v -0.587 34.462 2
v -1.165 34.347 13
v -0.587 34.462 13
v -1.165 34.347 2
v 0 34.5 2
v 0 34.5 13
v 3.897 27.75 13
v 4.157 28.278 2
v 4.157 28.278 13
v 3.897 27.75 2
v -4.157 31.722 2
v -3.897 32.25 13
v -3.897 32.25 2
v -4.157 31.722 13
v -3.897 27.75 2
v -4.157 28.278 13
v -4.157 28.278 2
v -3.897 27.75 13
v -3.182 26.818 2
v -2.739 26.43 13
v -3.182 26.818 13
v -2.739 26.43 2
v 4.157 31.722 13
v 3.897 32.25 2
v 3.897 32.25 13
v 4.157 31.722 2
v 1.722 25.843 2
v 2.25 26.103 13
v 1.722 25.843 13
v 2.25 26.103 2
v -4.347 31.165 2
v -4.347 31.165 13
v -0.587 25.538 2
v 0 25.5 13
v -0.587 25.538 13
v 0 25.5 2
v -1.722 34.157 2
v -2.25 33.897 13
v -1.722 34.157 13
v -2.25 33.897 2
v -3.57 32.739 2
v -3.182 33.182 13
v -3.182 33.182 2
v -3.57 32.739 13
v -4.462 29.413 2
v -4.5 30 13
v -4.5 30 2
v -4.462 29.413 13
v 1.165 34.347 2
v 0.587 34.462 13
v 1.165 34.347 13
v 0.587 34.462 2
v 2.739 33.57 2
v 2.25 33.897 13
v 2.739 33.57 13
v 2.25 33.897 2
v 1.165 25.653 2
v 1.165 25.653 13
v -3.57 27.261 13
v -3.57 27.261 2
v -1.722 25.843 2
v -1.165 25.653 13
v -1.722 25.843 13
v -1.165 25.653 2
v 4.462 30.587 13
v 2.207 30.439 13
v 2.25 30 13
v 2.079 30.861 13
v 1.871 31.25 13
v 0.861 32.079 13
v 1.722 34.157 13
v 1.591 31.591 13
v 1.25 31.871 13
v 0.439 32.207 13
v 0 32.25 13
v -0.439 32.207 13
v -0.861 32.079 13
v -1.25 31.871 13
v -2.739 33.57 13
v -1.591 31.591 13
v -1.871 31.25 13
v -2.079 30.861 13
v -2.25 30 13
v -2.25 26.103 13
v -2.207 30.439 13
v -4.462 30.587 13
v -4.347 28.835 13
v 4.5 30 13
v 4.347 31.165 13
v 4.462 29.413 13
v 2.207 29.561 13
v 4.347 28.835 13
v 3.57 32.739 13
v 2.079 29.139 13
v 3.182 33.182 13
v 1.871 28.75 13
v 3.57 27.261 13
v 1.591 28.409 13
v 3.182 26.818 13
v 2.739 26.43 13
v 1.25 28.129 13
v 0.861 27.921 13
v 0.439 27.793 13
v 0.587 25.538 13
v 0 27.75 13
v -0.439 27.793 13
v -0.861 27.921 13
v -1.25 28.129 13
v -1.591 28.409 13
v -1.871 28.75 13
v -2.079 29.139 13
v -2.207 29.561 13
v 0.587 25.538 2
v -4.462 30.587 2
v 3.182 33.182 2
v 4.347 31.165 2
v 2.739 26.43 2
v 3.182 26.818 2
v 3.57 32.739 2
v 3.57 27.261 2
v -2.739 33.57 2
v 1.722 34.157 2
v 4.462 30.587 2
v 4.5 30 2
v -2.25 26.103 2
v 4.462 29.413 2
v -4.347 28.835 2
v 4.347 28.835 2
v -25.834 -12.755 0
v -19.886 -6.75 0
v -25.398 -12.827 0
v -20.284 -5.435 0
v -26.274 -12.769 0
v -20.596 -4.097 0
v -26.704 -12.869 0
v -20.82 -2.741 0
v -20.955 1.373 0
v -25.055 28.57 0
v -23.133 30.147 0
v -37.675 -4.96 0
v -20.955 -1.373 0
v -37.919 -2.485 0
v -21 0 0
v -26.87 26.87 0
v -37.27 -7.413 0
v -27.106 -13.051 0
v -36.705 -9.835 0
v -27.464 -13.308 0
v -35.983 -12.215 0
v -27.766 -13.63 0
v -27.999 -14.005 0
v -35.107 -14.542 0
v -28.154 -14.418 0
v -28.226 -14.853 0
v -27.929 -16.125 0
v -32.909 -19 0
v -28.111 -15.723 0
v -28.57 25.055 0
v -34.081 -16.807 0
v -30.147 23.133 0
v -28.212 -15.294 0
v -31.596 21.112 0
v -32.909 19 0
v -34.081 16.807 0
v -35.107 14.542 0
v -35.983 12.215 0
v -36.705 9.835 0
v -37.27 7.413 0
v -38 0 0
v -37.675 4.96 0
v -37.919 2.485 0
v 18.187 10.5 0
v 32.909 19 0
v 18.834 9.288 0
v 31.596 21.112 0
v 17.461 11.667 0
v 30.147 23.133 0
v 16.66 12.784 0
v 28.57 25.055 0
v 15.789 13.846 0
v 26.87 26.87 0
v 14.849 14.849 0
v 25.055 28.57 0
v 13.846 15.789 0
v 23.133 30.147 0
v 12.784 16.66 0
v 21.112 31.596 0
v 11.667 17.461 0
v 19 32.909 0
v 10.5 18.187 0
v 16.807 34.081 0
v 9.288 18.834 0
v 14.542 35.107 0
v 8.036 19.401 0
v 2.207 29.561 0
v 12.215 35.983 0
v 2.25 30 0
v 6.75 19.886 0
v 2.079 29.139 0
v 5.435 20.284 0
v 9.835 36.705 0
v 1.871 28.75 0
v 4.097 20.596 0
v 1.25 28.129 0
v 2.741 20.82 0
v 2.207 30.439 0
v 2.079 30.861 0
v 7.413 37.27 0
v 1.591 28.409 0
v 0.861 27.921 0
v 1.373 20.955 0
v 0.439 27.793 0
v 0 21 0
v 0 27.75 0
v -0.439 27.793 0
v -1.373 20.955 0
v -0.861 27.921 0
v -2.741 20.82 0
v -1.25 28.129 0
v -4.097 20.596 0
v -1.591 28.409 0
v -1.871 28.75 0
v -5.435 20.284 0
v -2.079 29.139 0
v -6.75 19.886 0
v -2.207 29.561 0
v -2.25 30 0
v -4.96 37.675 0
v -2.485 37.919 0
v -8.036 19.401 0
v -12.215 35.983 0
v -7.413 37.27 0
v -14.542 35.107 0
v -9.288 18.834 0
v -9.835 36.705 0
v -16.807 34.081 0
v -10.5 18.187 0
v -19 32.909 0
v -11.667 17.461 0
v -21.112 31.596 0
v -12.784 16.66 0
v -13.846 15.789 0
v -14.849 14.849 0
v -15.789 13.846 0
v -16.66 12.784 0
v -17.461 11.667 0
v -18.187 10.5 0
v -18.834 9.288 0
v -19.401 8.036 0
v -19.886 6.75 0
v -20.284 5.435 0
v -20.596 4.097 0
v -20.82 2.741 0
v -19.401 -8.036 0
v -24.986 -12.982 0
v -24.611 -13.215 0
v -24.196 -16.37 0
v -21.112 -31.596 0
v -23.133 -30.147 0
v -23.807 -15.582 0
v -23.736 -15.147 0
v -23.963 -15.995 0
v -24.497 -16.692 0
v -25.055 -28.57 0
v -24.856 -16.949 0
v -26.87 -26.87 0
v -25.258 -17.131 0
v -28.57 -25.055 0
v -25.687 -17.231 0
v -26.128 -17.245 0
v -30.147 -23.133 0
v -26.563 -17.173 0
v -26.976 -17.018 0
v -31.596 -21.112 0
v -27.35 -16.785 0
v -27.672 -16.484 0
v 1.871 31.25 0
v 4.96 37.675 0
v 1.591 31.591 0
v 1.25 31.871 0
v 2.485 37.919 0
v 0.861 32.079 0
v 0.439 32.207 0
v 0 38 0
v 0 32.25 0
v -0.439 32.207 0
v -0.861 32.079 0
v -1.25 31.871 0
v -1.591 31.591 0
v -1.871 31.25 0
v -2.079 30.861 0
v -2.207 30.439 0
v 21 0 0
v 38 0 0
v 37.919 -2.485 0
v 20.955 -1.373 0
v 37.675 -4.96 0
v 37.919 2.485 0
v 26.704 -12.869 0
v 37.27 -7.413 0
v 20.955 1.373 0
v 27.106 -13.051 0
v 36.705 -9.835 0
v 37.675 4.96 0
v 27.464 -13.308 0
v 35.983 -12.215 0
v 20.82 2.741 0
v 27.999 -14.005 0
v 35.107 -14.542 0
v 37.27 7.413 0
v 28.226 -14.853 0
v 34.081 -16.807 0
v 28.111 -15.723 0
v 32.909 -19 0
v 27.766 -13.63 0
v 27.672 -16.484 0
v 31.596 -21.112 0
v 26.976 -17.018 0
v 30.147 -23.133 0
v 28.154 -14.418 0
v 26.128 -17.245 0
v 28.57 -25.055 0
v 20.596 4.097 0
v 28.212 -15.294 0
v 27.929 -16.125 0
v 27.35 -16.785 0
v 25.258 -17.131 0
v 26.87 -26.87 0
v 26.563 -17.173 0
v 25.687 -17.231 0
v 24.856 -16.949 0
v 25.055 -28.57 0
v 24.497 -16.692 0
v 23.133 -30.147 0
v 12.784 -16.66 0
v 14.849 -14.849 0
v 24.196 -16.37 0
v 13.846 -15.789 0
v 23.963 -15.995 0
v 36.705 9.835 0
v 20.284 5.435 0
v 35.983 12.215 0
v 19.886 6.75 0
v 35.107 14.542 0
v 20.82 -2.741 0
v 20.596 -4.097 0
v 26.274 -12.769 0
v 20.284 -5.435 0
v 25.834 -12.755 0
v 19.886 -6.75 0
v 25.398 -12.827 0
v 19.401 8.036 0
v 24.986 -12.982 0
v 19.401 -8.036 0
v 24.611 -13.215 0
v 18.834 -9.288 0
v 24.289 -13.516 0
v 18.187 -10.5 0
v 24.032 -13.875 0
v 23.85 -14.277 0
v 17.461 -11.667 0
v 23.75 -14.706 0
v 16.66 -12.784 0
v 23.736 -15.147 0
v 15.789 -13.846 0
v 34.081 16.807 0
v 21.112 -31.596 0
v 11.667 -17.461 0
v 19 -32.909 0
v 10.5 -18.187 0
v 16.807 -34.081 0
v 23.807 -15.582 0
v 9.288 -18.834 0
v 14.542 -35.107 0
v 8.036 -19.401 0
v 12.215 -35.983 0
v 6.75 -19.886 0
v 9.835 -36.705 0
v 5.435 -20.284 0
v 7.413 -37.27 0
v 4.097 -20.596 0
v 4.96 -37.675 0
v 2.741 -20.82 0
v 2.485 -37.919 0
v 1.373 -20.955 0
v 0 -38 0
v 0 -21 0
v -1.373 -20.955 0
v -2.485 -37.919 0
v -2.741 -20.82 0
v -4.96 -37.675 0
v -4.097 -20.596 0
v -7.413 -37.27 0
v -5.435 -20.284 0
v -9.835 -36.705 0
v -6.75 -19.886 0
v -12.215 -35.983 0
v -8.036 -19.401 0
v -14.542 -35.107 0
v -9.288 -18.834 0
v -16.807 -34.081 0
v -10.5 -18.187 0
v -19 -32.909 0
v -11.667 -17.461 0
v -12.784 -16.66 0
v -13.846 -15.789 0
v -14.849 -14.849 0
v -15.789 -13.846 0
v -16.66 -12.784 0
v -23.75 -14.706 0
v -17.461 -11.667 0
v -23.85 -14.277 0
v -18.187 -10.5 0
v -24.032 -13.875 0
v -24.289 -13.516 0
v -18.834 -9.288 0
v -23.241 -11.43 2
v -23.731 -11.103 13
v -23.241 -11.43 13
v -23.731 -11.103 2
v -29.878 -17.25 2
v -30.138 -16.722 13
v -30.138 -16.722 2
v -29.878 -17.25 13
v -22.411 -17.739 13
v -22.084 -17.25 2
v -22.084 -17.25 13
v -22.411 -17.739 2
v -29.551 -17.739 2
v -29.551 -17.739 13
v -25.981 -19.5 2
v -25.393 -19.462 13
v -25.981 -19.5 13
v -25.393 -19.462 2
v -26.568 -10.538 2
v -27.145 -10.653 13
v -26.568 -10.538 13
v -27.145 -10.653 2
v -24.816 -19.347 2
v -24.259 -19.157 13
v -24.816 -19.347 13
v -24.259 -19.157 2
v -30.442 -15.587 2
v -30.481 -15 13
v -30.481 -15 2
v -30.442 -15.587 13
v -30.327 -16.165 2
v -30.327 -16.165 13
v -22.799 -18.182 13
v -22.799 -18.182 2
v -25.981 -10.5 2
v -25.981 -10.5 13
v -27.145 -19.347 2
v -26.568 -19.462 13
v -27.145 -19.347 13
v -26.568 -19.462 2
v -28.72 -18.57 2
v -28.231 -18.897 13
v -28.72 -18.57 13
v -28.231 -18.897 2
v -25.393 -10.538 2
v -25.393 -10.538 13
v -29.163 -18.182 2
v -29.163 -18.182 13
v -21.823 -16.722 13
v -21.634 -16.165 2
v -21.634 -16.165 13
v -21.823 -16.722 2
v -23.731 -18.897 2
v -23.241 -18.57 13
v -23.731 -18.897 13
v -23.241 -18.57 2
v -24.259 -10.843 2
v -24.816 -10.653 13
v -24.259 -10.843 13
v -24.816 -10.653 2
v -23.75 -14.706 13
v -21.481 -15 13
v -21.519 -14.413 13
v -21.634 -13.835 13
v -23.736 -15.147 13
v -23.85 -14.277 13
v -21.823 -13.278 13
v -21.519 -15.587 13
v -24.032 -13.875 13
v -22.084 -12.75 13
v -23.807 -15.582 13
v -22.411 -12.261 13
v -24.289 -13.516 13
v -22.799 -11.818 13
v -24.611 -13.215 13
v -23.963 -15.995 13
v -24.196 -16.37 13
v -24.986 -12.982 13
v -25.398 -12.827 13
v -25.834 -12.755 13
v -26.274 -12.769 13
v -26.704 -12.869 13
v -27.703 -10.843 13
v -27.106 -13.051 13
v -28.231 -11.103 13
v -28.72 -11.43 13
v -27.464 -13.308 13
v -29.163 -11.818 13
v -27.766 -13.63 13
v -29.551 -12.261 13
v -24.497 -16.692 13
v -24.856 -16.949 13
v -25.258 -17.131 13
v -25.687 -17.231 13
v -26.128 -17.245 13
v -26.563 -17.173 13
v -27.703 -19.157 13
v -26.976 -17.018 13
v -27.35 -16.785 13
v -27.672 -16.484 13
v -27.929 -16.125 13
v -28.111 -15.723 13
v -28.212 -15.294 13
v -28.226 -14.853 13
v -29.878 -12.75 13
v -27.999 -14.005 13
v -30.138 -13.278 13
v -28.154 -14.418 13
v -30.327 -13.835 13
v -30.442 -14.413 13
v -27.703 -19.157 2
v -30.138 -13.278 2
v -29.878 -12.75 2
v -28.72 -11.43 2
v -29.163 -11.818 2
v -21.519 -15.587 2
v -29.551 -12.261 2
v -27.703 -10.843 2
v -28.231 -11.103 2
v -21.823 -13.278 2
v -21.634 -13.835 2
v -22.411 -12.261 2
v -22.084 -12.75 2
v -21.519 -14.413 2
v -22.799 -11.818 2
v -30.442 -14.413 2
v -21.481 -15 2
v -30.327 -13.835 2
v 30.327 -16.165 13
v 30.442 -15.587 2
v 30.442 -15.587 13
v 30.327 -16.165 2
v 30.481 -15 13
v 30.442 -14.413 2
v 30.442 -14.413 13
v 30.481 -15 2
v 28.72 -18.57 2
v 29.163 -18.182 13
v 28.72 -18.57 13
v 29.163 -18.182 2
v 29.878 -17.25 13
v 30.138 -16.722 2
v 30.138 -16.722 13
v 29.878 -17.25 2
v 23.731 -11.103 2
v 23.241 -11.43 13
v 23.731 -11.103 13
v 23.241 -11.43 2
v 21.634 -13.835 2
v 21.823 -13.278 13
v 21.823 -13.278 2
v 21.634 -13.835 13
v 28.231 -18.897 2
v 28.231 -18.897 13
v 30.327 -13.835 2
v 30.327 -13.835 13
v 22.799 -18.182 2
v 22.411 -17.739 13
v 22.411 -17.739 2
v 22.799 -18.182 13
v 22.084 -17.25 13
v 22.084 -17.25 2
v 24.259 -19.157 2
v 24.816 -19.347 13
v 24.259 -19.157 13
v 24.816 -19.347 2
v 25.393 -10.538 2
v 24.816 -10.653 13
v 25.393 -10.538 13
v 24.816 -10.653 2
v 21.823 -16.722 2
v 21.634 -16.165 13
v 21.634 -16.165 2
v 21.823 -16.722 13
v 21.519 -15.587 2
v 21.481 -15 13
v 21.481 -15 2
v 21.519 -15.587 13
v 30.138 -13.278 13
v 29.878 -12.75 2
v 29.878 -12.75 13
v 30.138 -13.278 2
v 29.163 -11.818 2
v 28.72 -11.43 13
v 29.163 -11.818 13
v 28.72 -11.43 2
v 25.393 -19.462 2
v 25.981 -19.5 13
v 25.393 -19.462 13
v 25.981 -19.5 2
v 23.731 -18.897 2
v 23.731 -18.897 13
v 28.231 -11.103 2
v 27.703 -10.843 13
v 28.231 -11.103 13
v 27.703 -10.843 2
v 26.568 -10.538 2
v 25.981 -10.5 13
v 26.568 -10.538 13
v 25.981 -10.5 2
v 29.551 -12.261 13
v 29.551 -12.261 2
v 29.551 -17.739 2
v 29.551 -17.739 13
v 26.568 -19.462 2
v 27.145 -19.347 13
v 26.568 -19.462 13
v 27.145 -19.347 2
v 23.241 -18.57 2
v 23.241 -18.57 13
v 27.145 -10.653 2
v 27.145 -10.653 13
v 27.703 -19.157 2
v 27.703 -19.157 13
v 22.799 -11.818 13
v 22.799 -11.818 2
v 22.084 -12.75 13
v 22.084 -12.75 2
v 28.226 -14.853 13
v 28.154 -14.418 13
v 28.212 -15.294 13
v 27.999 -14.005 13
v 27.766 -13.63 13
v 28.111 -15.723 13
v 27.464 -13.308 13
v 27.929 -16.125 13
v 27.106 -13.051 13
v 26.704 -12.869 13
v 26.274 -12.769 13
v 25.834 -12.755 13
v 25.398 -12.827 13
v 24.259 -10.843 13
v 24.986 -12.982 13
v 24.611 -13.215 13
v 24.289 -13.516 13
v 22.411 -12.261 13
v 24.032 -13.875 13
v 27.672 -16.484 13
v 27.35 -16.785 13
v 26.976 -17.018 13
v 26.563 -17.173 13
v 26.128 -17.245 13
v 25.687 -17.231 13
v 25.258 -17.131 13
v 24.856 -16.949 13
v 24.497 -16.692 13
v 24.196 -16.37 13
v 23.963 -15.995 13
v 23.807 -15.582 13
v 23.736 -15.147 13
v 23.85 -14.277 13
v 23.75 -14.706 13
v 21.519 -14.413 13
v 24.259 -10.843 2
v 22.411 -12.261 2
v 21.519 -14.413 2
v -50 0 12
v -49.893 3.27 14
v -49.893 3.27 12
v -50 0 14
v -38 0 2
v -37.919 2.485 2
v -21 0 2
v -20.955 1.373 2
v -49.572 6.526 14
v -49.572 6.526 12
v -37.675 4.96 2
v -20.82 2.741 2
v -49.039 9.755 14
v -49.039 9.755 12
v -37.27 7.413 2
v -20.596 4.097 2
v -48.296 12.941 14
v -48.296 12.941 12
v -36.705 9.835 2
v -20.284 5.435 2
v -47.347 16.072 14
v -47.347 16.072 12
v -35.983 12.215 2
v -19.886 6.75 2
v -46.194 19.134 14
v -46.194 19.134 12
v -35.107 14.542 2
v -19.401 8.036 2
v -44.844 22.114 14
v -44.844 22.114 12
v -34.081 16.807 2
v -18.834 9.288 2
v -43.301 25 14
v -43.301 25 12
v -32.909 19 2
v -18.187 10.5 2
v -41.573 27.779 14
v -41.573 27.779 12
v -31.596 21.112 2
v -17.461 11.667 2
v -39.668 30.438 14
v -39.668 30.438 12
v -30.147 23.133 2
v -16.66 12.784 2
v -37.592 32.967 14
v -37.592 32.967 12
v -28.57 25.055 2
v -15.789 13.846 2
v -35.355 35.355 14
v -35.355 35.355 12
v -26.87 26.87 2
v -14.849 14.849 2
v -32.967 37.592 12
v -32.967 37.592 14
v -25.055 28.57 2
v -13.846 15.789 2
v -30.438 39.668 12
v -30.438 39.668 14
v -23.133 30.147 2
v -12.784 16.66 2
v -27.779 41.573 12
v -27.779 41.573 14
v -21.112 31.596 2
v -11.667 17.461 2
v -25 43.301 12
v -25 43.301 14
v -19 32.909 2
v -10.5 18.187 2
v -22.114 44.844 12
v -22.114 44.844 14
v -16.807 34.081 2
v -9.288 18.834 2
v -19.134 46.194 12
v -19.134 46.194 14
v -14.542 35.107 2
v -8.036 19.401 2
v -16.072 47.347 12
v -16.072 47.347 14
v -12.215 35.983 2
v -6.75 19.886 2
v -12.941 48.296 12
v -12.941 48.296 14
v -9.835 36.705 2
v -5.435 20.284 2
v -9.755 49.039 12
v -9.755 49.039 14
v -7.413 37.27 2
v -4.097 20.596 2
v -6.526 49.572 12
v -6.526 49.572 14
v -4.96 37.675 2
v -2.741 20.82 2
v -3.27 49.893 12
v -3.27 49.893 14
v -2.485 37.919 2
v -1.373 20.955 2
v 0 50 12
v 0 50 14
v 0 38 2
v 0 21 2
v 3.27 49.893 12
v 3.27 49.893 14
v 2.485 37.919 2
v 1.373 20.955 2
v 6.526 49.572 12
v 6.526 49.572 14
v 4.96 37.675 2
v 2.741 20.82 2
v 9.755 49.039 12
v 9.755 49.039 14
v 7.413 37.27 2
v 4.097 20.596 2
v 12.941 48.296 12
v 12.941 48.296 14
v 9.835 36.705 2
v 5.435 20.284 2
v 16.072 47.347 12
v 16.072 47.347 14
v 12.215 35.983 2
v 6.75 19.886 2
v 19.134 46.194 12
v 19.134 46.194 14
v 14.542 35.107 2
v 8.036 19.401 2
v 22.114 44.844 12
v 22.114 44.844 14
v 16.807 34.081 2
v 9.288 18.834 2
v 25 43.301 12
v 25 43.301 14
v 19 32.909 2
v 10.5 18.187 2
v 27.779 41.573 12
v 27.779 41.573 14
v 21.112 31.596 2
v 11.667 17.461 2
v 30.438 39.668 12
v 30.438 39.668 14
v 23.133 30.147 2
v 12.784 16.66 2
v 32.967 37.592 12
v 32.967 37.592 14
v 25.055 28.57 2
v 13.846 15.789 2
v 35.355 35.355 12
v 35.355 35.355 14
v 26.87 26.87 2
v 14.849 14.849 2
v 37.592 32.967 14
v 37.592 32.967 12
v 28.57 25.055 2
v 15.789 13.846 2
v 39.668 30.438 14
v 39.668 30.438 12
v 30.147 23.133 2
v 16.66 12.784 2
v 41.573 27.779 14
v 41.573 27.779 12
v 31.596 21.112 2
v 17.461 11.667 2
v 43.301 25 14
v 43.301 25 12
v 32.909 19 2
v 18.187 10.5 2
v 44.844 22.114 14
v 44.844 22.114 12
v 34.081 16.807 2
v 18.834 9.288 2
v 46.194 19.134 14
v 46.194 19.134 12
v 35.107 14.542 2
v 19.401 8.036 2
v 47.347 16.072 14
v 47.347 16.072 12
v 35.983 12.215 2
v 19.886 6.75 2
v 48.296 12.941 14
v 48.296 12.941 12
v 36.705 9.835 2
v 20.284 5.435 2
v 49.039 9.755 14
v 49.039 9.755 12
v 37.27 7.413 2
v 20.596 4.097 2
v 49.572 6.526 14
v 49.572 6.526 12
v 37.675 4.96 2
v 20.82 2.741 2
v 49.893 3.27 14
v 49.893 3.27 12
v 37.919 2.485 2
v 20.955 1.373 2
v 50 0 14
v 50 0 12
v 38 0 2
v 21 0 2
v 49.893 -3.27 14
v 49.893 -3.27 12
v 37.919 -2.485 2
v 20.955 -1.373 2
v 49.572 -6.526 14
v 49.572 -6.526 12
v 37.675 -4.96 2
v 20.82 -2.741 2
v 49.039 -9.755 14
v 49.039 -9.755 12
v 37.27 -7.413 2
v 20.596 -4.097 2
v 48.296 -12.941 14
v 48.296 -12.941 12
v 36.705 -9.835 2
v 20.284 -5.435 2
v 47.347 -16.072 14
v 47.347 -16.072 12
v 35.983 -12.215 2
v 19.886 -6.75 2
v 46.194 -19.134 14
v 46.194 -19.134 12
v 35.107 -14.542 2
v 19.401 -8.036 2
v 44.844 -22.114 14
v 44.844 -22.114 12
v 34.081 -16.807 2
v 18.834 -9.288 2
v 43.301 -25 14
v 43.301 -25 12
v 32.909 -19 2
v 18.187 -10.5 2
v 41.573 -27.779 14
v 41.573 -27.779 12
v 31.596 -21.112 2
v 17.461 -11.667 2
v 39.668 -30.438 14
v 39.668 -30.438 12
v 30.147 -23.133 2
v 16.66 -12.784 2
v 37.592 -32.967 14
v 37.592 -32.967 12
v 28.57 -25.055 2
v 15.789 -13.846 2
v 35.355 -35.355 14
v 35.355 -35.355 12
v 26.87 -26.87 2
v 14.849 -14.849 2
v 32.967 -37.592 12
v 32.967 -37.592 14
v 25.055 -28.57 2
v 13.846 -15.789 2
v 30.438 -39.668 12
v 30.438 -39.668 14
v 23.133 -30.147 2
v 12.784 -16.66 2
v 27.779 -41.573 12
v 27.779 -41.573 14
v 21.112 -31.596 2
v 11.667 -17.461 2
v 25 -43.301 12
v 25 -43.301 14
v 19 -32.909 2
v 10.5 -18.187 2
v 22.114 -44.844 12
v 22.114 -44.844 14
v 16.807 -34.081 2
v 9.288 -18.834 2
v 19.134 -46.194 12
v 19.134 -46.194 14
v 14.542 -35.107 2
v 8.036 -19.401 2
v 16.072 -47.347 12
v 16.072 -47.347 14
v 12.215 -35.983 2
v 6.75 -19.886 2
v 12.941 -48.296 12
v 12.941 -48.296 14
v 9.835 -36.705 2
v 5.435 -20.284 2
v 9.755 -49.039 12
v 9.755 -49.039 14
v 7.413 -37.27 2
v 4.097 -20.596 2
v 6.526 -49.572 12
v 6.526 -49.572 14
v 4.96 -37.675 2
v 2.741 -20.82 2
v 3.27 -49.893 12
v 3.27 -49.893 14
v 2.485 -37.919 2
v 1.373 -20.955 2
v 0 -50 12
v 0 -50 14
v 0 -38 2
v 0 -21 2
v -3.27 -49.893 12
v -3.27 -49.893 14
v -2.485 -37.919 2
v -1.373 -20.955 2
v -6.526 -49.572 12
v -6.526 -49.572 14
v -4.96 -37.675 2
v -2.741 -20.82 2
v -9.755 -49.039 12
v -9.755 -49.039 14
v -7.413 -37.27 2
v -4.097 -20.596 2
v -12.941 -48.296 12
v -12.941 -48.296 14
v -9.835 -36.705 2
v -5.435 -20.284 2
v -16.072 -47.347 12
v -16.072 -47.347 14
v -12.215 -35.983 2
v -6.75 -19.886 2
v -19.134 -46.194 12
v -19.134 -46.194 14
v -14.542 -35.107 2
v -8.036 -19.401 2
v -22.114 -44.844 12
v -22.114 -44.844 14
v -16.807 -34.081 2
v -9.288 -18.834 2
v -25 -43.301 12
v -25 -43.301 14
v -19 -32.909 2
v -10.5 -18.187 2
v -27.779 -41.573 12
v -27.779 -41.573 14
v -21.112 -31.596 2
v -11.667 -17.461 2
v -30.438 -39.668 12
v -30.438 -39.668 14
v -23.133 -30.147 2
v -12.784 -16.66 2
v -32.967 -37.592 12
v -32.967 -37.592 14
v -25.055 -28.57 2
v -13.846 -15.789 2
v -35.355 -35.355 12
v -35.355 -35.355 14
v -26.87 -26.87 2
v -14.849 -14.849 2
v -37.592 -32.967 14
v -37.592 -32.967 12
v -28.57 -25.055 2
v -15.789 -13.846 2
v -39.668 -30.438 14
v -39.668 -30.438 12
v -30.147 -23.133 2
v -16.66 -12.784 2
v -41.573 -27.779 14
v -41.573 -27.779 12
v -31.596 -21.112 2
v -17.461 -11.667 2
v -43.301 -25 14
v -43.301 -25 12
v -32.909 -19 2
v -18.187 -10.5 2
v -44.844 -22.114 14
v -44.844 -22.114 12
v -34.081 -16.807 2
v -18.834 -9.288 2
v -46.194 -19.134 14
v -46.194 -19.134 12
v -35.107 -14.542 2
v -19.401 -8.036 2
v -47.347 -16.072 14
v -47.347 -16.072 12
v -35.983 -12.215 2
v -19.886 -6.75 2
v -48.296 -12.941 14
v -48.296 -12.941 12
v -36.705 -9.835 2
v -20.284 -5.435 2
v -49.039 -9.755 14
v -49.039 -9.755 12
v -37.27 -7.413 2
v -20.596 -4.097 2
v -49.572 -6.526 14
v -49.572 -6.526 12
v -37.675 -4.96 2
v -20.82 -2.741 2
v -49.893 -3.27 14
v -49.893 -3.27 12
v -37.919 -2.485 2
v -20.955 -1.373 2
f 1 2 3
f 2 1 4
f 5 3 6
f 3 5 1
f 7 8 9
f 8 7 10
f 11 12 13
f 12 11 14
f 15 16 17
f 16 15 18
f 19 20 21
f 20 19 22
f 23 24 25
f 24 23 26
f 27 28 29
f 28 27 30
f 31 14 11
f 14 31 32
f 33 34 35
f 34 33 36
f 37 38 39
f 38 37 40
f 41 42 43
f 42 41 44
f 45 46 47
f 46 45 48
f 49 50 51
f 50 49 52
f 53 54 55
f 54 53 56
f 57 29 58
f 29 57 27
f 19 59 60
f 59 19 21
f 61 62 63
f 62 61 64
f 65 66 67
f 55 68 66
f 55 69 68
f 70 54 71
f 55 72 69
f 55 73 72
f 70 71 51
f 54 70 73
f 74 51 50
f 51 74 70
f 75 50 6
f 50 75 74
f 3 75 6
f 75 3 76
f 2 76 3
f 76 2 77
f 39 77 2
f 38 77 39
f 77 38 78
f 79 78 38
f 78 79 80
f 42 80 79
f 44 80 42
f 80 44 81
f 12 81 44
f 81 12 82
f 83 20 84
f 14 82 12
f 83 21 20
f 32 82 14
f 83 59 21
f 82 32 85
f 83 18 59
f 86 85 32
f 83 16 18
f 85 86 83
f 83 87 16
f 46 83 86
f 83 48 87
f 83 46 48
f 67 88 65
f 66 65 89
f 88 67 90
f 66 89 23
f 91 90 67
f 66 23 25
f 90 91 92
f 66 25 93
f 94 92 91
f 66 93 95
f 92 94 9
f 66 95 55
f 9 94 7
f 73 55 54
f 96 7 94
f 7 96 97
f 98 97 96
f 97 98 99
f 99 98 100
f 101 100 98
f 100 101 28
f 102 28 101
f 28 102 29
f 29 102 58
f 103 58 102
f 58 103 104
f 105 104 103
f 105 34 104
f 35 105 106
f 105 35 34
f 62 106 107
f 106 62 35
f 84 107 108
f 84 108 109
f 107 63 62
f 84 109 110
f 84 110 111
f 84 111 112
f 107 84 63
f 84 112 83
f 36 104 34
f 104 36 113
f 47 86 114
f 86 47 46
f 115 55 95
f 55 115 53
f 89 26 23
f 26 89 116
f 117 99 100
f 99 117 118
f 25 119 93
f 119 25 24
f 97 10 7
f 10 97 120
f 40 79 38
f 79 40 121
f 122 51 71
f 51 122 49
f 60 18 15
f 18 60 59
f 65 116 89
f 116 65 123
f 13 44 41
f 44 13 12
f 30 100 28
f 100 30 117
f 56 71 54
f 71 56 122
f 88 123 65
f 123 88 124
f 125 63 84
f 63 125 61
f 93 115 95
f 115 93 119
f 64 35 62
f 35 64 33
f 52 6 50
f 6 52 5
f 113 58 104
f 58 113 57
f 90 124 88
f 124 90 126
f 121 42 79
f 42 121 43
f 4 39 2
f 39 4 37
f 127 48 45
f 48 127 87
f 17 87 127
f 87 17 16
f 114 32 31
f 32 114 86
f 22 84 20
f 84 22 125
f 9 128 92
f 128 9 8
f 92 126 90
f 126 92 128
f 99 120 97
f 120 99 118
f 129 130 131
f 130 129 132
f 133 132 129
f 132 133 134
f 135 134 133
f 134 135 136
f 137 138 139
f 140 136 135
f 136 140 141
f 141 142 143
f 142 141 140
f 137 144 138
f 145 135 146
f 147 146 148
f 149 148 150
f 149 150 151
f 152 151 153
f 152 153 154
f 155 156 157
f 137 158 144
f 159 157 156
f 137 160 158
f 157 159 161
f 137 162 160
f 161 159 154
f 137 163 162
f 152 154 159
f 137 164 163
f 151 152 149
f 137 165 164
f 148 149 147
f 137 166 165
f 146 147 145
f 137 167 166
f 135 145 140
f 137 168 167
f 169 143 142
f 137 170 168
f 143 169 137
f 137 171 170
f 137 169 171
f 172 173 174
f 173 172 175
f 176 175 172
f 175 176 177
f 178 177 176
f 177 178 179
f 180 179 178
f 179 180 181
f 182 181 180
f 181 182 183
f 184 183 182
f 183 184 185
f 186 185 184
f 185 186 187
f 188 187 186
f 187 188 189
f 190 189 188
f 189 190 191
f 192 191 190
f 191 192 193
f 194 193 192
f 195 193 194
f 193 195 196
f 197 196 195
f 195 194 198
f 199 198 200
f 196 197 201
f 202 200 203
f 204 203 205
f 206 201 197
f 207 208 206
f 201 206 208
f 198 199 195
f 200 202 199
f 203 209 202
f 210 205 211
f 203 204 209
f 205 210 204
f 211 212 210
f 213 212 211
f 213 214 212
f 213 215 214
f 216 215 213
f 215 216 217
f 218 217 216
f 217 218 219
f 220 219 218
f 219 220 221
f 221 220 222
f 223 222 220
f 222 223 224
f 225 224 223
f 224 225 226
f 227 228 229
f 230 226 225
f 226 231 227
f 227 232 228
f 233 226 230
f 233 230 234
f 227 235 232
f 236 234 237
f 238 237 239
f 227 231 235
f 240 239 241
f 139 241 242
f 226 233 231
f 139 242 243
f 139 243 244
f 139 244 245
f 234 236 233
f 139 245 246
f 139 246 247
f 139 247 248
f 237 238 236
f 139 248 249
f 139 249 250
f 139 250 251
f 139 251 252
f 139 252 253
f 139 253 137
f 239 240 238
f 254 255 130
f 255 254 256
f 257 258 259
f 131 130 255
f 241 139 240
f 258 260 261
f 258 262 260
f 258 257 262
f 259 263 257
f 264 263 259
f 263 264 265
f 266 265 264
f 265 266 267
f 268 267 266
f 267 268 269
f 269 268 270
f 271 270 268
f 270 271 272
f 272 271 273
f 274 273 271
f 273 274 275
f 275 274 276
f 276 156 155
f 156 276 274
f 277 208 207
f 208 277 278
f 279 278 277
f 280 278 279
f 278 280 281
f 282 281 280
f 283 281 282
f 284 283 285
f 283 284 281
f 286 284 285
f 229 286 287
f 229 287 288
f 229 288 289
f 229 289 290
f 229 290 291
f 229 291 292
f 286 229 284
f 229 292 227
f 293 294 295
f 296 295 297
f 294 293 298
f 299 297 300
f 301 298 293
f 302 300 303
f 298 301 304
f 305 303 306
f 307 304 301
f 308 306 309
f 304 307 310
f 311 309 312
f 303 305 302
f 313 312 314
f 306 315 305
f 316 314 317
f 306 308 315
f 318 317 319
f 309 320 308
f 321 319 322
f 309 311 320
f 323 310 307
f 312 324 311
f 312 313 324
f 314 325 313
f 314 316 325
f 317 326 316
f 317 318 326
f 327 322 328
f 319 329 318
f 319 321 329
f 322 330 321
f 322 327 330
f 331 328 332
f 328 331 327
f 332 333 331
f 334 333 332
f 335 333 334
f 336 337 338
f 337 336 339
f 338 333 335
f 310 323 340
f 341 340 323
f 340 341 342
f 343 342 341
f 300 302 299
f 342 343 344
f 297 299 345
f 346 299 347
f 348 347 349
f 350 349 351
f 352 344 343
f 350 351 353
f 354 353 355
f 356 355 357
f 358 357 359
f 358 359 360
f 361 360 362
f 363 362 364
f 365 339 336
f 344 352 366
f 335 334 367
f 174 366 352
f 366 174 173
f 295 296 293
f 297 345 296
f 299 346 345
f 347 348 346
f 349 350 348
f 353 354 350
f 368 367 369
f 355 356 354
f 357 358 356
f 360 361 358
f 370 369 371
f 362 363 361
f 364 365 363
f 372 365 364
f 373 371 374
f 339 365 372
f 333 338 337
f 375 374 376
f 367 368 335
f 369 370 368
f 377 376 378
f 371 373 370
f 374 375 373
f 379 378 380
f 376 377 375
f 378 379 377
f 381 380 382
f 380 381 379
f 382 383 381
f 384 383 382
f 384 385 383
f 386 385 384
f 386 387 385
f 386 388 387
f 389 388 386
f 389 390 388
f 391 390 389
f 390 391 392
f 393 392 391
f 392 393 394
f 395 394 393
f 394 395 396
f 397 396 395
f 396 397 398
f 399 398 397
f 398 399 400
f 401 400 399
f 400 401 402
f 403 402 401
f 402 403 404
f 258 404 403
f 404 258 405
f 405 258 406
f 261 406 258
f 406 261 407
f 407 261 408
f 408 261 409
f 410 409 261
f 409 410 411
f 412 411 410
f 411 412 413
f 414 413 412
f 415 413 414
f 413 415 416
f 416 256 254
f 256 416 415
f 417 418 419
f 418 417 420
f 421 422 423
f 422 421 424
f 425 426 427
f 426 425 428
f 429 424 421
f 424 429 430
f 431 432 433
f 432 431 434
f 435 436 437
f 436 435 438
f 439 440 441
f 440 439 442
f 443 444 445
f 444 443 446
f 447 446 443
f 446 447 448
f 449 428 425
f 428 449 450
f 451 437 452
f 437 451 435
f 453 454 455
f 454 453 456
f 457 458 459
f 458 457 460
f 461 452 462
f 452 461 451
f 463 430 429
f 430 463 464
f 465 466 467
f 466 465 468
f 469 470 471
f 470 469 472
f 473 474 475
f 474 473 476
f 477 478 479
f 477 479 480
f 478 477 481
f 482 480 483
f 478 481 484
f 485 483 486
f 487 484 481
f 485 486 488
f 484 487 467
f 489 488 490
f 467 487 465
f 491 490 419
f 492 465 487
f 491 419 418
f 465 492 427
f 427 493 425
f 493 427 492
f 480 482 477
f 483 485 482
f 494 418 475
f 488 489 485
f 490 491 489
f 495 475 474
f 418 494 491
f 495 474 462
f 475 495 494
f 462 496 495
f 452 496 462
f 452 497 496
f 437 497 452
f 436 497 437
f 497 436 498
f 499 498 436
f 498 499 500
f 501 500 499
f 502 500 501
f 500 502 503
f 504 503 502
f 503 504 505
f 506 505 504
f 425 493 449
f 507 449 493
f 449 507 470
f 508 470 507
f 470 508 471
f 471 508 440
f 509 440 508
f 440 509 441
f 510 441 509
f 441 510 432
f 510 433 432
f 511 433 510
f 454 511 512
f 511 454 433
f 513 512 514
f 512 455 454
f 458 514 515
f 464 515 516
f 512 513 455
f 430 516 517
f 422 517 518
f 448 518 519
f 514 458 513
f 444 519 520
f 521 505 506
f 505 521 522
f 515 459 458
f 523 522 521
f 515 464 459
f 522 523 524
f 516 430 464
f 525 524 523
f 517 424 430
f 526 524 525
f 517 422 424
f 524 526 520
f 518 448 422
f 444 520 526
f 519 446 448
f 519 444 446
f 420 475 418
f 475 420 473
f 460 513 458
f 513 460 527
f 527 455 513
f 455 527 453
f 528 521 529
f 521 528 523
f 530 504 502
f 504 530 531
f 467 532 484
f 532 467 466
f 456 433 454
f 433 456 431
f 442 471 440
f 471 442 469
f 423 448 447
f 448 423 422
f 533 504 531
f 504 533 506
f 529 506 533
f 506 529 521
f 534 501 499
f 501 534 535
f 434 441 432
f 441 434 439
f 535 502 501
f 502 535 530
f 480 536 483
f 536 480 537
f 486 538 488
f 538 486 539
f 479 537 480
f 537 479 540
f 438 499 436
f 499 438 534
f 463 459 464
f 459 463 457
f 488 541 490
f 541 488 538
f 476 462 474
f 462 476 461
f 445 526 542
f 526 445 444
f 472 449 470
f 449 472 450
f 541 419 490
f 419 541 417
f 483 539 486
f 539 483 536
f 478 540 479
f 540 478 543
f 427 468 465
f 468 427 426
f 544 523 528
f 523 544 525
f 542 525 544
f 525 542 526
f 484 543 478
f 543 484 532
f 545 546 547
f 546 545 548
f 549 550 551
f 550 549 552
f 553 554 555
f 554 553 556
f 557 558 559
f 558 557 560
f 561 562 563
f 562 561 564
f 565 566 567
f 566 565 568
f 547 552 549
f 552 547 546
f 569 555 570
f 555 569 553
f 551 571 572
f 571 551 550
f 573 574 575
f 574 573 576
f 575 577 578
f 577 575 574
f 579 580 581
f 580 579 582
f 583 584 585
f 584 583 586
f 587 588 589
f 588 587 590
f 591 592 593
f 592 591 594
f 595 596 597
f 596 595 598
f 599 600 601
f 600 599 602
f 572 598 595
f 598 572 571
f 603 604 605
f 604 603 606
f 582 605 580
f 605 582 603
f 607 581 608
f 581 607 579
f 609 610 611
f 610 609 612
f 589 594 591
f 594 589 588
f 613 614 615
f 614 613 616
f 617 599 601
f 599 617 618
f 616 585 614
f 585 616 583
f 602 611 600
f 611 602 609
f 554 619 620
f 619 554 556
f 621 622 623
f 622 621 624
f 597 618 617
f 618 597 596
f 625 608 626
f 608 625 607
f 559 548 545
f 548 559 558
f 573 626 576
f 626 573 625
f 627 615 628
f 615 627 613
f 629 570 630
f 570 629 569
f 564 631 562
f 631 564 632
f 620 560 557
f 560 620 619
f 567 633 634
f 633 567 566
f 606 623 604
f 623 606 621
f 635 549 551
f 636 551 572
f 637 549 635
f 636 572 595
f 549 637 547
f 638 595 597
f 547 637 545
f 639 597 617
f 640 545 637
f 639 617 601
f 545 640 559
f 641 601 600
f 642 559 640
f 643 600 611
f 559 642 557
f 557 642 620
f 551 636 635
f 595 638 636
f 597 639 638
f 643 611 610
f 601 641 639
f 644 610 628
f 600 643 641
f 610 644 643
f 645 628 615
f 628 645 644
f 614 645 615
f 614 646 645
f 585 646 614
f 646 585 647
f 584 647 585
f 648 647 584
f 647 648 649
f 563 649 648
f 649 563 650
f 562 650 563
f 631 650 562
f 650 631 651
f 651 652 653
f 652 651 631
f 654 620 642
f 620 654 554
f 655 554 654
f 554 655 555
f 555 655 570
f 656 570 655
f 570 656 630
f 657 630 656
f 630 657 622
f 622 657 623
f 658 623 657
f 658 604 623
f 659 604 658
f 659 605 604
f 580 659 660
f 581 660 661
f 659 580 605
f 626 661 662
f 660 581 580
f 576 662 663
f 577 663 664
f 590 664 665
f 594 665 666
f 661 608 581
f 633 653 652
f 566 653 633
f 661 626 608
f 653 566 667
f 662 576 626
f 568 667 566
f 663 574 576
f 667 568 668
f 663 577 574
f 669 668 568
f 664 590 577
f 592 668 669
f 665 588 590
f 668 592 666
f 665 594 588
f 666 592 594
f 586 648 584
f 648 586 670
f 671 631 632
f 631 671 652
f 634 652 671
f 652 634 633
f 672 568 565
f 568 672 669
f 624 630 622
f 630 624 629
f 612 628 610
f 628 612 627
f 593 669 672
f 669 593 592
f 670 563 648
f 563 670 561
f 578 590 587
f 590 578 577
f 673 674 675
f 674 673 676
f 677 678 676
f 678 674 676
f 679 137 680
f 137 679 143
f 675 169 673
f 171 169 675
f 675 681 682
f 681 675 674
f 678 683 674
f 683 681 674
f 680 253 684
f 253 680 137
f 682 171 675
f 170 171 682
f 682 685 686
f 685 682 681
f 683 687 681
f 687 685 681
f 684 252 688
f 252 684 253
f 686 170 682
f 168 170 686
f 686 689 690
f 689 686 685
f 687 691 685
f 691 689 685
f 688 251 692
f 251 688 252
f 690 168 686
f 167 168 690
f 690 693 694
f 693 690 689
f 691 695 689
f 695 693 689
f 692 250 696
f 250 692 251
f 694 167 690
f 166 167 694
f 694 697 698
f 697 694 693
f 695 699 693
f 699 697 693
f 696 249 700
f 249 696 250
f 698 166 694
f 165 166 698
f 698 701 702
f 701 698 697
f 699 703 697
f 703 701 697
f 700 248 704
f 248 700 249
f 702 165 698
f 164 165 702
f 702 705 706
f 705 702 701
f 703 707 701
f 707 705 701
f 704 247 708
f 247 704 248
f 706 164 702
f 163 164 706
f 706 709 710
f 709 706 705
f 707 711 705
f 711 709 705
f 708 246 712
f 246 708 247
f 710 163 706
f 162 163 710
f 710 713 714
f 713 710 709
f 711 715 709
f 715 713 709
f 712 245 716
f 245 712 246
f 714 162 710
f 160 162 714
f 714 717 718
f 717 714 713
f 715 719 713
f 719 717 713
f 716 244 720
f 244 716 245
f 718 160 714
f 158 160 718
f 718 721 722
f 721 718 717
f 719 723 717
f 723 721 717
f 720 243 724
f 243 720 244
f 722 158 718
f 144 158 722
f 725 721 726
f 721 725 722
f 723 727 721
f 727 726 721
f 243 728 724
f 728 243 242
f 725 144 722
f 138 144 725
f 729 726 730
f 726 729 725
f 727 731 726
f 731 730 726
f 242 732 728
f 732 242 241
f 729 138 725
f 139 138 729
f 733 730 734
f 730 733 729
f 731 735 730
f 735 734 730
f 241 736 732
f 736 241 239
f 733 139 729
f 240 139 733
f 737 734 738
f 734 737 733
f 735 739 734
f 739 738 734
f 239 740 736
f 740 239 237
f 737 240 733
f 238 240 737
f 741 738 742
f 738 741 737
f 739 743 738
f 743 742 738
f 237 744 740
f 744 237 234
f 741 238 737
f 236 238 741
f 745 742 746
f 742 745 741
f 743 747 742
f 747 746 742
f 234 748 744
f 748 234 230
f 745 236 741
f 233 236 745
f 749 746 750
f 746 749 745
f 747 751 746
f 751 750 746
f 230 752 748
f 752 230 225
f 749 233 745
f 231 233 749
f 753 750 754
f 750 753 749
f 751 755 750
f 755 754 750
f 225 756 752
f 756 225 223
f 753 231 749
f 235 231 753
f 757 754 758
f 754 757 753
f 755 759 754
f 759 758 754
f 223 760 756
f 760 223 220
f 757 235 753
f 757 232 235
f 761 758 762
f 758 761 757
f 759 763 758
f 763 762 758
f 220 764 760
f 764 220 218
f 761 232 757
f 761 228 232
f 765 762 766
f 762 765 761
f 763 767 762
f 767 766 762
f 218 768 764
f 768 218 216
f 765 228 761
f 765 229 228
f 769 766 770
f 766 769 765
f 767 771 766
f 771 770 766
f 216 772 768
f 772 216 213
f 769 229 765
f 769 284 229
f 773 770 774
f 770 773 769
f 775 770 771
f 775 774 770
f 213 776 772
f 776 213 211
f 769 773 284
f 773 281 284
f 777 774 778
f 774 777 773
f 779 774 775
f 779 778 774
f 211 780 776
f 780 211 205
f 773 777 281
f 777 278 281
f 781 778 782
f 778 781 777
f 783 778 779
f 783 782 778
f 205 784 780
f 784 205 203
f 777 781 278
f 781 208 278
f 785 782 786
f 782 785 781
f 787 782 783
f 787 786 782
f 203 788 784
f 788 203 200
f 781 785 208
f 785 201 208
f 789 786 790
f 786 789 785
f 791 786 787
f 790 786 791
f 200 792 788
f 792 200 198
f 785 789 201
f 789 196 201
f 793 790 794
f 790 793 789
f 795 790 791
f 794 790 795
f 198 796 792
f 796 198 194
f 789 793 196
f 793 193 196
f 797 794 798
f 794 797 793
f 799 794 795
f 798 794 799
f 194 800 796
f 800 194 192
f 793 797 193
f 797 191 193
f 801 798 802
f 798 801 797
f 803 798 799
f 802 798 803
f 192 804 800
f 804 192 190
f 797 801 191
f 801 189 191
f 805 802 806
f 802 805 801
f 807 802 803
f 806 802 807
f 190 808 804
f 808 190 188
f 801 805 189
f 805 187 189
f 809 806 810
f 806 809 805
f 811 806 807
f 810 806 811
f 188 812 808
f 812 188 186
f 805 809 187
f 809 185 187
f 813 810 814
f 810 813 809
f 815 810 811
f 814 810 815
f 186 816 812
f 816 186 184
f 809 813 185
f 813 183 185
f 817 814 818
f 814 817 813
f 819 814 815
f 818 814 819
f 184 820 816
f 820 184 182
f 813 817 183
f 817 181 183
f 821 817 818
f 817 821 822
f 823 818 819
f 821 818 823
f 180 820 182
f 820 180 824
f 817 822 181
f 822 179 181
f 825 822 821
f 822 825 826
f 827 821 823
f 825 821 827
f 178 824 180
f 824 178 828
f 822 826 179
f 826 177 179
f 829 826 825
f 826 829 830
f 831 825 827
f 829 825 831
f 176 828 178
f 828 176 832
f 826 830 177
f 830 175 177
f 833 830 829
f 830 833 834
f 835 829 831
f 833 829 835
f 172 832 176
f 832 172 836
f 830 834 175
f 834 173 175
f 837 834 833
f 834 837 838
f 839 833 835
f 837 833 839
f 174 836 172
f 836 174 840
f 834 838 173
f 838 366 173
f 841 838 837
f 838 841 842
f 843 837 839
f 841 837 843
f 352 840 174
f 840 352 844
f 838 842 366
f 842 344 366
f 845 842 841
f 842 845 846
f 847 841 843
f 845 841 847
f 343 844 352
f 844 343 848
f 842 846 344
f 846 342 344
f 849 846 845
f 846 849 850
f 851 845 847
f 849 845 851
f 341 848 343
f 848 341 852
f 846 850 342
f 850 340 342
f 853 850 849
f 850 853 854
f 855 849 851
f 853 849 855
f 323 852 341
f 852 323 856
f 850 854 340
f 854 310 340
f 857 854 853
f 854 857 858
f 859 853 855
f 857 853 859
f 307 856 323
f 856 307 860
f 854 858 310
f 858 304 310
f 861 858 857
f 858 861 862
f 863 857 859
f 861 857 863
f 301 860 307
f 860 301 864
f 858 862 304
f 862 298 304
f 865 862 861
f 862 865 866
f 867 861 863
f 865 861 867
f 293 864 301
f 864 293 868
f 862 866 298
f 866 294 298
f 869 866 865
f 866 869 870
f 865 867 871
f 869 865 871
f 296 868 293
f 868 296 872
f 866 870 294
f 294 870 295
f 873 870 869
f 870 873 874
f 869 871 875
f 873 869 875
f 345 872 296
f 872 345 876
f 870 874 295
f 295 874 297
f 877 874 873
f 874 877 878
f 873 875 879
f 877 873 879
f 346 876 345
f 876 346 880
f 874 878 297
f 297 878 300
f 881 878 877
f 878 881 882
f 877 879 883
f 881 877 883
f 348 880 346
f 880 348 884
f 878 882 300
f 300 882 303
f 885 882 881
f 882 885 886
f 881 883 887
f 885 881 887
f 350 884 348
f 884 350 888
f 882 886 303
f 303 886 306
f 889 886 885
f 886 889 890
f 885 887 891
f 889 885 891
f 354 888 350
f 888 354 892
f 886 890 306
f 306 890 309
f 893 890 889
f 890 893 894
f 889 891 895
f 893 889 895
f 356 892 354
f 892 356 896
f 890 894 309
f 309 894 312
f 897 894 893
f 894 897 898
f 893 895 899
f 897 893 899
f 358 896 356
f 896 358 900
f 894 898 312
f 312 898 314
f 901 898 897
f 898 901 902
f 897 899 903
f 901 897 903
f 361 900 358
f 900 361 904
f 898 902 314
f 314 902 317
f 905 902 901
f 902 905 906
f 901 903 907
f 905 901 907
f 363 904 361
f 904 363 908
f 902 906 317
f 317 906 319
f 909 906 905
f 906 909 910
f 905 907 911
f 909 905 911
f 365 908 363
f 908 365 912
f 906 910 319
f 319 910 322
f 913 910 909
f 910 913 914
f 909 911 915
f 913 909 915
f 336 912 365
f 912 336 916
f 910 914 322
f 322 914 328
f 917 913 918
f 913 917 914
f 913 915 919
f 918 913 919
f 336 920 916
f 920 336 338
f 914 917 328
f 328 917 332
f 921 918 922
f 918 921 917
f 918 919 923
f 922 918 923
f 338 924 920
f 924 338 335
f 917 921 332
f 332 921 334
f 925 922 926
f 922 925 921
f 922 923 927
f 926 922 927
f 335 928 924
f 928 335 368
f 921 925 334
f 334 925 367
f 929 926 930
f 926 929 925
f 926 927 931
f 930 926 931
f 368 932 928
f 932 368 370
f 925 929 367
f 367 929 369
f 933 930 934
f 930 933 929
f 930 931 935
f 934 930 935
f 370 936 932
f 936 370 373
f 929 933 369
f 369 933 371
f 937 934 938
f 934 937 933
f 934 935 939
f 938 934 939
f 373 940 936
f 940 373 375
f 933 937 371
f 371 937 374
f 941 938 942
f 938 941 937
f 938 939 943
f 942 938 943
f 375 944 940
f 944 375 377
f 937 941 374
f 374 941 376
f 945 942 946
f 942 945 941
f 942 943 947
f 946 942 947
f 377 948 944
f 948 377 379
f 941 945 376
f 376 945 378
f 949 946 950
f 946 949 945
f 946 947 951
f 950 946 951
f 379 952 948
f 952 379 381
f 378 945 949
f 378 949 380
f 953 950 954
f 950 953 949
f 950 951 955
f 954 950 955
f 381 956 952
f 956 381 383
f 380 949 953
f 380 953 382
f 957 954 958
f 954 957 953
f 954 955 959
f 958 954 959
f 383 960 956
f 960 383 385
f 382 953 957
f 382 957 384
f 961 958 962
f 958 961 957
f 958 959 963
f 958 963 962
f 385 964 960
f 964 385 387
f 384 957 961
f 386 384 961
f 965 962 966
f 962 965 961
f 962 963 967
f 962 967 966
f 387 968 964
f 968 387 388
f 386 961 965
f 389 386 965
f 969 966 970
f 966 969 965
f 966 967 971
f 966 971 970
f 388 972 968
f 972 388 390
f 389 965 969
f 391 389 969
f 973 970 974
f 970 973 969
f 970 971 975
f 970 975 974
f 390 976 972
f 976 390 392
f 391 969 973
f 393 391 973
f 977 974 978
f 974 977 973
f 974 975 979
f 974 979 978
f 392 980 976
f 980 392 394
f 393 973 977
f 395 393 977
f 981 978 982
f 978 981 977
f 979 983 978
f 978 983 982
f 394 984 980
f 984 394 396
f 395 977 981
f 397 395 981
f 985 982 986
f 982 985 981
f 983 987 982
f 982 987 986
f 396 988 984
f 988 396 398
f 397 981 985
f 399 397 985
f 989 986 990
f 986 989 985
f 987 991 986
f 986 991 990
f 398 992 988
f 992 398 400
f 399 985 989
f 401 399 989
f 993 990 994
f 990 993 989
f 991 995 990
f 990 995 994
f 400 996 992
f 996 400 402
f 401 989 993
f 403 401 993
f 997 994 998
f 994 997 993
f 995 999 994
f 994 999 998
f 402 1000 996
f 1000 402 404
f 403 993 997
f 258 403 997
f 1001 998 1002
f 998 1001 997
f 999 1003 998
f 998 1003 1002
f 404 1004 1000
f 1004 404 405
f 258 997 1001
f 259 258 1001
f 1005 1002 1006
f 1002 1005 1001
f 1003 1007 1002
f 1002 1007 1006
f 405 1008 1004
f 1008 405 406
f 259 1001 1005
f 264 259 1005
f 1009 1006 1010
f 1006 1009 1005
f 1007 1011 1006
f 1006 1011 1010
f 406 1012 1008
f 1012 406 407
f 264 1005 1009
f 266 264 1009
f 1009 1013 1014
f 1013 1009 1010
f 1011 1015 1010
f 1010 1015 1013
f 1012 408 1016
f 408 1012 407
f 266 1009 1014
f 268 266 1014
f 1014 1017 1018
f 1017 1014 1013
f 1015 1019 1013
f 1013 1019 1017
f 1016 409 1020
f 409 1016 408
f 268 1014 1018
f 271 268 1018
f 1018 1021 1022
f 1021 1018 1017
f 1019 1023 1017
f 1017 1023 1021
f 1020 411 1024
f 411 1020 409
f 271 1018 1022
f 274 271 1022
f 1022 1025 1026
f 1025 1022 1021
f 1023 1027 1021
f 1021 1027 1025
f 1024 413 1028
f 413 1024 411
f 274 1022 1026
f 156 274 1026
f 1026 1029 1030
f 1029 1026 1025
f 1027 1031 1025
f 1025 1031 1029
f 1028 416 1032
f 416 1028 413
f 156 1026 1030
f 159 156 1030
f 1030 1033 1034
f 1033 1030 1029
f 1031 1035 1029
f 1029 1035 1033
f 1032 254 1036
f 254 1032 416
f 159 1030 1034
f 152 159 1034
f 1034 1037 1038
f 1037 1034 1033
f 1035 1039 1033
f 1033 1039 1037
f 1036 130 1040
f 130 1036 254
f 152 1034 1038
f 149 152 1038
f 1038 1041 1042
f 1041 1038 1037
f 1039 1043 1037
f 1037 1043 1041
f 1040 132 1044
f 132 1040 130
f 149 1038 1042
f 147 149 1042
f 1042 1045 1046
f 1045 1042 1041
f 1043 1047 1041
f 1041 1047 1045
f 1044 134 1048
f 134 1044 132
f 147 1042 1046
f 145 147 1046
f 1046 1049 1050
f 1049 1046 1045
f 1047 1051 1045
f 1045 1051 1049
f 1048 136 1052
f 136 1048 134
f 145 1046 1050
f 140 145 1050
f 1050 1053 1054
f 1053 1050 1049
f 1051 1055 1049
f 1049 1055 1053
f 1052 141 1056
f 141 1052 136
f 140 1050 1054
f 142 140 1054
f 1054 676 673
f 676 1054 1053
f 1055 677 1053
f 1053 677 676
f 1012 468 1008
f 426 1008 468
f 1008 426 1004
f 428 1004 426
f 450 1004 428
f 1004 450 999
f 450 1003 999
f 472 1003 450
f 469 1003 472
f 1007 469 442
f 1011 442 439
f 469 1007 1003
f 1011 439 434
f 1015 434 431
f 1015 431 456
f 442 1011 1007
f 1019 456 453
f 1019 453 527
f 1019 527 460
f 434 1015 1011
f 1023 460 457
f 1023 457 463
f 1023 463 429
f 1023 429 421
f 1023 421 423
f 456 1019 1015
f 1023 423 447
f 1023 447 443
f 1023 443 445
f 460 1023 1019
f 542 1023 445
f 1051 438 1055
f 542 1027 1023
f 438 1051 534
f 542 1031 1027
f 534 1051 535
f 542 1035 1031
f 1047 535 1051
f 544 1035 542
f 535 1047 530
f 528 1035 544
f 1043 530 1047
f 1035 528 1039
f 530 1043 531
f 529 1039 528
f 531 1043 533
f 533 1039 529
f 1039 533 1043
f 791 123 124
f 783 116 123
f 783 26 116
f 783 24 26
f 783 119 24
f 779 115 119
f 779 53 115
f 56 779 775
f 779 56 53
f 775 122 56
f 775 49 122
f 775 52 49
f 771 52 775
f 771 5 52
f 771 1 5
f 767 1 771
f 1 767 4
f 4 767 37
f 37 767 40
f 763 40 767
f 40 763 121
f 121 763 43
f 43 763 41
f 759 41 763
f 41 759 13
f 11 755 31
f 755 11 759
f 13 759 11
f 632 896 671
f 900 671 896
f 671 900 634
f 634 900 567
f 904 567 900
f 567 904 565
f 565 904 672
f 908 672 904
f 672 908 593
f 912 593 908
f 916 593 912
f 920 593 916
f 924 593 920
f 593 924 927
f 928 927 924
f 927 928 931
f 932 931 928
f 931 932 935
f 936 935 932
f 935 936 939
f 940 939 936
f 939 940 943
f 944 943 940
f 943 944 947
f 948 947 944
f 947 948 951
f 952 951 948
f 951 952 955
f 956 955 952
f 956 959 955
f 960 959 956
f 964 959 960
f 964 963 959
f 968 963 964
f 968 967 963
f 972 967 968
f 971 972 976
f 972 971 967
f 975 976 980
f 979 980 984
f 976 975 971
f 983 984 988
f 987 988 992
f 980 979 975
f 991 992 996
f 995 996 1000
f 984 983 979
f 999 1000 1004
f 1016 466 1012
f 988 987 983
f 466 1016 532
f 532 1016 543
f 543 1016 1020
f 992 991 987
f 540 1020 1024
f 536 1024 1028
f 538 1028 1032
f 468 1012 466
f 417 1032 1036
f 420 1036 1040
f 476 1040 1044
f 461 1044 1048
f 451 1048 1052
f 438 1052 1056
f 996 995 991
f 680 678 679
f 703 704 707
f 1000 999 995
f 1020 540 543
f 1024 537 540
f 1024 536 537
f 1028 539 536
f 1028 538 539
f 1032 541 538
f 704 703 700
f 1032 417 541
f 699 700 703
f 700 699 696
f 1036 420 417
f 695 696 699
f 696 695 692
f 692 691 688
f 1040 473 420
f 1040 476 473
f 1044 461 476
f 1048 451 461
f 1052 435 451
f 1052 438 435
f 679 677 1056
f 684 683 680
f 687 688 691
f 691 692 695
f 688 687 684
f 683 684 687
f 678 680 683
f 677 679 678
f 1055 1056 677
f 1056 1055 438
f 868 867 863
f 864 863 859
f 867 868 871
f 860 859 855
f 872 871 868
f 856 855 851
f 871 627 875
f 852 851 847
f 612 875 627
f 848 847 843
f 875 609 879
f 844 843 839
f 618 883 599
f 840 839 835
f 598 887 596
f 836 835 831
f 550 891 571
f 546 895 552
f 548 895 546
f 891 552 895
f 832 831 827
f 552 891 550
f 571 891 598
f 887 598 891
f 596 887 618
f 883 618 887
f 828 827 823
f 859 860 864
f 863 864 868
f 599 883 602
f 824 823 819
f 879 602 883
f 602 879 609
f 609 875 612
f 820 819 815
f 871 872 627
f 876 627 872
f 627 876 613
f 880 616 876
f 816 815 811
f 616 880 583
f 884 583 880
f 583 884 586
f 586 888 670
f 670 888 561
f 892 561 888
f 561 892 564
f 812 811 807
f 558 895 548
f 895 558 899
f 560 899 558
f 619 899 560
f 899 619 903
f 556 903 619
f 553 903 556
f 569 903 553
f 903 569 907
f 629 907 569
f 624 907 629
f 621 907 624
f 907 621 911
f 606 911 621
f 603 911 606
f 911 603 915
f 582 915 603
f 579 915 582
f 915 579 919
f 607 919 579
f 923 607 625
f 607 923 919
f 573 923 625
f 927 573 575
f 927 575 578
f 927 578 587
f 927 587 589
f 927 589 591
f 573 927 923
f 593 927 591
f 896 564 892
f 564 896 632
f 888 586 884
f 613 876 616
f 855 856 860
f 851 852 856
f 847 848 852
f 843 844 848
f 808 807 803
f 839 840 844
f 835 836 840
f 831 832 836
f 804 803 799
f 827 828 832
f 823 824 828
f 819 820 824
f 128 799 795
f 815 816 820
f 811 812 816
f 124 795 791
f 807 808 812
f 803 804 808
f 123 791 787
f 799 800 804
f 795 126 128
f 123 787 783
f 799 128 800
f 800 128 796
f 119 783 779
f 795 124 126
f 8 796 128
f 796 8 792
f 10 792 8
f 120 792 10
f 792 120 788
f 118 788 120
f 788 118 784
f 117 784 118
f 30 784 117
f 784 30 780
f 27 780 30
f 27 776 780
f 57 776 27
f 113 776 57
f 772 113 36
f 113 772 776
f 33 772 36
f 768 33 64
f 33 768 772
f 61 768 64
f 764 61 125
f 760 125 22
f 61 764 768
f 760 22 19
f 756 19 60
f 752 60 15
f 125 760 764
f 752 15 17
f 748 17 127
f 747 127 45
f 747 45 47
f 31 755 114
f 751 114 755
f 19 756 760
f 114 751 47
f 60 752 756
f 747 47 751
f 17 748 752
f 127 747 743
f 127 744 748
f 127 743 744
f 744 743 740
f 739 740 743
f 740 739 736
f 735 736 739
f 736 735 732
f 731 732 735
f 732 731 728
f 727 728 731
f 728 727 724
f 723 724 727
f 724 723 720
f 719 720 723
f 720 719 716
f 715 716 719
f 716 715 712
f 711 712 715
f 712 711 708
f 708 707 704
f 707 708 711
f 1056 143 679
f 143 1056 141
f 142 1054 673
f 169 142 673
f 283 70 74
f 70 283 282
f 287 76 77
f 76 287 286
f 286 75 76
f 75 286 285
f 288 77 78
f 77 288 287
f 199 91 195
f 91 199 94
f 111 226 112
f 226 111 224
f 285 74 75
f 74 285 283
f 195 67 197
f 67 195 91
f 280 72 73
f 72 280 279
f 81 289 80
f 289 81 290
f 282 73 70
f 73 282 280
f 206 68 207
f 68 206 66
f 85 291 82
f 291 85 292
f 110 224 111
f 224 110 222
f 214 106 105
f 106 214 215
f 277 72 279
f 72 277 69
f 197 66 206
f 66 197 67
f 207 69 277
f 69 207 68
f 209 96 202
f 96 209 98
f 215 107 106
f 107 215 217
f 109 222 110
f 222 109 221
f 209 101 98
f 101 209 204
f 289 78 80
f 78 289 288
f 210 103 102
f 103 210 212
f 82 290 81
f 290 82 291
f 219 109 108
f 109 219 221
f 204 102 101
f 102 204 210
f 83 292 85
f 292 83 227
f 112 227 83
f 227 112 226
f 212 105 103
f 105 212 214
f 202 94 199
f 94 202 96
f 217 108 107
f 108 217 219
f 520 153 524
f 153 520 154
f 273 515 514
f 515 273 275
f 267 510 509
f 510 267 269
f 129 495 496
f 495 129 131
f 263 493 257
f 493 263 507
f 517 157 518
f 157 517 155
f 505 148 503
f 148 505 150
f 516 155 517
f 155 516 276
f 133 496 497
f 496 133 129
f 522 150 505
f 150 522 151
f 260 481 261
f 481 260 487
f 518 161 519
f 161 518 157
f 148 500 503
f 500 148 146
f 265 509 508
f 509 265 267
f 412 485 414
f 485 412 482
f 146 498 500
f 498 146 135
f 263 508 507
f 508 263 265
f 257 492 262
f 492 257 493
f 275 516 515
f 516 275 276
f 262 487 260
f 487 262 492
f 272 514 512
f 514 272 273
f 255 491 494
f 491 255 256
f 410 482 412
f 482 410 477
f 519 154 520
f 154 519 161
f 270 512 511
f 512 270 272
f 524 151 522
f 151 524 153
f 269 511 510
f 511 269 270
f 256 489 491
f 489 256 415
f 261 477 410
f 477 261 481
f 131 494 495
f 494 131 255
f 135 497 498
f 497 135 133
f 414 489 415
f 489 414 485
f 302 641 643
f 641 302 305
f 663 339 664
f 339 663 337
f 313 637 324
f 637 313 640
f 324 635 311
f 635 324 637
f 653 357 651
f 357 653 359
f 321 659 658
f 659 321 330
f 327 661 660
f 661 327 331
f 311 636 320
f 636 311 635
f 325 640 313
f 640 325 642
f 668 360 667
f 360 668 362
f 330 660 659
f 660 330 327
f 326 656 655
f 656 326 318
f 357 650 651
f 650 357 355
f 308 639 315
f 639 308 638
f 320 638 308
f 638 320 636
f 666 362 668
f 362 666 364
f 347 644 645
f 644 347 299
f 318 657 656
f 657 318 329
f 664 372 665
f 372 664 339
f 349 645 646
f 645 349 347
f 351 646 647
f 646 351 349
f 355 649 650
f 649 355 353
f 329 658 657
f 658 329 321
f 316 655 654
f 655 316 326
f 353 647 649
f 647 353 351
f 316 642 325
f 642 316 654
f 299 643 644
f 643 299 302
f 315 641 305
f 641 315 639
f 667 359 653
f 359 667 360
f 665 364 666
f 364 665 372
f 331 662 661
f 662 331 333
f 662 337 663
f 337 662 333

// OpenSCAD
// Outside sensor pod: a louvred shield around bare, coated I2C sensor boards (Adafruit 25.4 x 17.78 outline).
// Three printed parts on three M4 rods: louvre (x5), cap, base. Louvre and cap print upside down as shown here
// (in-use top face on the bed, skirt and spacer tubes rising); the base prints as used. No supports.
part = "louvre";     // louvre | cap | base

/* [Louvre] */
cav_r = 21;          // open centre: the sensor cavity
flat_r = 38;         // flat ring ends, 45 degree skirt starts
out_r = 50;
plate_t = 2;
drop = 14;           // skirt tip below the plate's top face, in use
pitch = 13;          // plate to plate; drop - pitch is the rain overlap
n_louvres = 5;

/* [Rods] */
post_r = 30;
post_d = 9;
rod_d = 4.5;         // M4 clearance, printed
post_a = [90, 210, 330];

/* [Cap] */
cap_t = 3;
win_ap = 12;         // light aperture for the lux sensor
win_flare = 18;      // aperture's mouth on the top face
win_d = 20.4;        // seat for a 20 mm disc of 3 mm clear acrylic, bedded from inside
collar_h = 3.5;
collar_wall = 2;

/* [Base] */
base_t = 5;
boss_h = 3;          // lifts the bottom louvre so its skirt clears the tongue
bridge_w = 14;
fin_t = 4;
fin_w = 22;
fin_h = 60;
tongue_l = 82;       // from the pod's axis to the tongue's end
tongue_w = 40;
slot_x = 66;         // two M5 slots: placeholder mount until the site is chosen
slot_dy = 20;
slot_w = 5.5;
slot_l = 10;
tie = [5, 2.5];      // zip-tie slots for the lead's strain relief

/* [Board bay: Adafruit LPS3X board file] */
hole_pitch = 20.32;  // the board's two holes, along its long edge
hole_inset = 2.54;   // hole line in from that edge
board_w = 17.78;
board_z = 40;        // board centre above the base's underside
standoff = 3;        // board's back off the fin: clears the address jumper and solder joints
screw_d = 2.9;       // M2.5 clearance, printed

/* [Hidden] */
$fn = 96;
hole_y = -(board_w/2 - hole_inset);

module rods(h) { for (a = post_a) rotate(a) translate([post_r, 0, -1]) cylinder(d = rod_d, h = h + 2, $fn = 32); }

module skirt_plate(r_in) {
    rotate_extrude() polygon([[r_in, 0], [flat_r, 0], [out_r, drop - plate_t], [out_r, drop], [flat_r, plate_t], [r_in, plate_t]]);
    for (a = post_a) rotate(a) translate([post_r, 0, 0]) cylinder(d = post_d, h = pitch, $fn = 48);
}

module louvre() { difference() { skirt_plate(cav_r); rods(drop); } }

module cap() {
    difference() {
        union() {
            skirt_plate(0);
            cylinder(r = flat_r, h = cap_t);
            cylinder(d = win_d + 2*collar_wall, h = cap_t + collar_h);
        }
        rods(drop);
        translate([0, 0, cap_t]) cylinder(d = win_d, h = collar_h + 1);
        translate([0, 0, -0.01]) cylinder(d1 = win_flare, d2 = win_ap, h = cap_t + 0.02);
    }
}

module base() {
    difference() {
        union() {
            linear_extrude(base_t) {
                difference() { circle(r = flat_r); circle(r = cav_r); }
                square([bridge_w, 2*cav_r + 2], center = true);
                hull() { translate([post_r, -tongue_w/2]) square([1, tongue_w]); for (sy = [-1, 1]) translate([tongue_l - 6, sy*(tongue_w/2 - 6)]) circle(r = 6); }
            }
            for (a = post_a) rotate(a) translate([post_r, 0, 0]) cylinder(d = post_d, h = base_t + boss_h, $fn = 48);
            translate([-fin_t/2, -fin_w/2, 0]) cube([fin_t, fin_w, base_t + fin_h]);
            for (sy = [-1, 1]) translate([0, sy*(fin_w/2 - 1) + 1, 0]) rotate([90, 0, 0])         // gussets
                linear_extrude(2) polygon([[-bridge_w/2, base_t], [bridge_w/2, base_t], [fin_t/2, base_t + 20], [-fin_t/2, base_t + 20]]);
            for (sz = [-1, 1]) translate([0, hole_y, board_z + sz*hole_pitch/2]) rotate([45, 0, 0])  // diamond standoffs
                cube([fin_t + 2*standoff, 5.5, 5.5], center = true);
        }
        rods(base_t + boss_h);
        for (sz = [-1, 1]) translate([0, hole_y, board_z + sz*hole_pitch/2]) rotate([0, 90, 0]) cylinder(d = screw_d, h = 30, center = true, $fn = 24);
        for (sy = [-1, 1]) translate([slot_x, sy*slot_dy/2, -1]) linear_extrude(base_t + 2)
            hull() for (sx = [-1, 1]) translate([sx*(slot_l - slot_w)/2, 0]) circle(d = slot_w, $fn = 32);
        for (sx = [-1, 1], sy = [-1, 1]) translate([sx*4.5, sy*16, base_t/2]) cube([tie[1], tie[0], base_t + 2], center = true);
    }
}

if (part == "louvre") louvre();
if (part == "cap") cap();
if (part == "base") base();
